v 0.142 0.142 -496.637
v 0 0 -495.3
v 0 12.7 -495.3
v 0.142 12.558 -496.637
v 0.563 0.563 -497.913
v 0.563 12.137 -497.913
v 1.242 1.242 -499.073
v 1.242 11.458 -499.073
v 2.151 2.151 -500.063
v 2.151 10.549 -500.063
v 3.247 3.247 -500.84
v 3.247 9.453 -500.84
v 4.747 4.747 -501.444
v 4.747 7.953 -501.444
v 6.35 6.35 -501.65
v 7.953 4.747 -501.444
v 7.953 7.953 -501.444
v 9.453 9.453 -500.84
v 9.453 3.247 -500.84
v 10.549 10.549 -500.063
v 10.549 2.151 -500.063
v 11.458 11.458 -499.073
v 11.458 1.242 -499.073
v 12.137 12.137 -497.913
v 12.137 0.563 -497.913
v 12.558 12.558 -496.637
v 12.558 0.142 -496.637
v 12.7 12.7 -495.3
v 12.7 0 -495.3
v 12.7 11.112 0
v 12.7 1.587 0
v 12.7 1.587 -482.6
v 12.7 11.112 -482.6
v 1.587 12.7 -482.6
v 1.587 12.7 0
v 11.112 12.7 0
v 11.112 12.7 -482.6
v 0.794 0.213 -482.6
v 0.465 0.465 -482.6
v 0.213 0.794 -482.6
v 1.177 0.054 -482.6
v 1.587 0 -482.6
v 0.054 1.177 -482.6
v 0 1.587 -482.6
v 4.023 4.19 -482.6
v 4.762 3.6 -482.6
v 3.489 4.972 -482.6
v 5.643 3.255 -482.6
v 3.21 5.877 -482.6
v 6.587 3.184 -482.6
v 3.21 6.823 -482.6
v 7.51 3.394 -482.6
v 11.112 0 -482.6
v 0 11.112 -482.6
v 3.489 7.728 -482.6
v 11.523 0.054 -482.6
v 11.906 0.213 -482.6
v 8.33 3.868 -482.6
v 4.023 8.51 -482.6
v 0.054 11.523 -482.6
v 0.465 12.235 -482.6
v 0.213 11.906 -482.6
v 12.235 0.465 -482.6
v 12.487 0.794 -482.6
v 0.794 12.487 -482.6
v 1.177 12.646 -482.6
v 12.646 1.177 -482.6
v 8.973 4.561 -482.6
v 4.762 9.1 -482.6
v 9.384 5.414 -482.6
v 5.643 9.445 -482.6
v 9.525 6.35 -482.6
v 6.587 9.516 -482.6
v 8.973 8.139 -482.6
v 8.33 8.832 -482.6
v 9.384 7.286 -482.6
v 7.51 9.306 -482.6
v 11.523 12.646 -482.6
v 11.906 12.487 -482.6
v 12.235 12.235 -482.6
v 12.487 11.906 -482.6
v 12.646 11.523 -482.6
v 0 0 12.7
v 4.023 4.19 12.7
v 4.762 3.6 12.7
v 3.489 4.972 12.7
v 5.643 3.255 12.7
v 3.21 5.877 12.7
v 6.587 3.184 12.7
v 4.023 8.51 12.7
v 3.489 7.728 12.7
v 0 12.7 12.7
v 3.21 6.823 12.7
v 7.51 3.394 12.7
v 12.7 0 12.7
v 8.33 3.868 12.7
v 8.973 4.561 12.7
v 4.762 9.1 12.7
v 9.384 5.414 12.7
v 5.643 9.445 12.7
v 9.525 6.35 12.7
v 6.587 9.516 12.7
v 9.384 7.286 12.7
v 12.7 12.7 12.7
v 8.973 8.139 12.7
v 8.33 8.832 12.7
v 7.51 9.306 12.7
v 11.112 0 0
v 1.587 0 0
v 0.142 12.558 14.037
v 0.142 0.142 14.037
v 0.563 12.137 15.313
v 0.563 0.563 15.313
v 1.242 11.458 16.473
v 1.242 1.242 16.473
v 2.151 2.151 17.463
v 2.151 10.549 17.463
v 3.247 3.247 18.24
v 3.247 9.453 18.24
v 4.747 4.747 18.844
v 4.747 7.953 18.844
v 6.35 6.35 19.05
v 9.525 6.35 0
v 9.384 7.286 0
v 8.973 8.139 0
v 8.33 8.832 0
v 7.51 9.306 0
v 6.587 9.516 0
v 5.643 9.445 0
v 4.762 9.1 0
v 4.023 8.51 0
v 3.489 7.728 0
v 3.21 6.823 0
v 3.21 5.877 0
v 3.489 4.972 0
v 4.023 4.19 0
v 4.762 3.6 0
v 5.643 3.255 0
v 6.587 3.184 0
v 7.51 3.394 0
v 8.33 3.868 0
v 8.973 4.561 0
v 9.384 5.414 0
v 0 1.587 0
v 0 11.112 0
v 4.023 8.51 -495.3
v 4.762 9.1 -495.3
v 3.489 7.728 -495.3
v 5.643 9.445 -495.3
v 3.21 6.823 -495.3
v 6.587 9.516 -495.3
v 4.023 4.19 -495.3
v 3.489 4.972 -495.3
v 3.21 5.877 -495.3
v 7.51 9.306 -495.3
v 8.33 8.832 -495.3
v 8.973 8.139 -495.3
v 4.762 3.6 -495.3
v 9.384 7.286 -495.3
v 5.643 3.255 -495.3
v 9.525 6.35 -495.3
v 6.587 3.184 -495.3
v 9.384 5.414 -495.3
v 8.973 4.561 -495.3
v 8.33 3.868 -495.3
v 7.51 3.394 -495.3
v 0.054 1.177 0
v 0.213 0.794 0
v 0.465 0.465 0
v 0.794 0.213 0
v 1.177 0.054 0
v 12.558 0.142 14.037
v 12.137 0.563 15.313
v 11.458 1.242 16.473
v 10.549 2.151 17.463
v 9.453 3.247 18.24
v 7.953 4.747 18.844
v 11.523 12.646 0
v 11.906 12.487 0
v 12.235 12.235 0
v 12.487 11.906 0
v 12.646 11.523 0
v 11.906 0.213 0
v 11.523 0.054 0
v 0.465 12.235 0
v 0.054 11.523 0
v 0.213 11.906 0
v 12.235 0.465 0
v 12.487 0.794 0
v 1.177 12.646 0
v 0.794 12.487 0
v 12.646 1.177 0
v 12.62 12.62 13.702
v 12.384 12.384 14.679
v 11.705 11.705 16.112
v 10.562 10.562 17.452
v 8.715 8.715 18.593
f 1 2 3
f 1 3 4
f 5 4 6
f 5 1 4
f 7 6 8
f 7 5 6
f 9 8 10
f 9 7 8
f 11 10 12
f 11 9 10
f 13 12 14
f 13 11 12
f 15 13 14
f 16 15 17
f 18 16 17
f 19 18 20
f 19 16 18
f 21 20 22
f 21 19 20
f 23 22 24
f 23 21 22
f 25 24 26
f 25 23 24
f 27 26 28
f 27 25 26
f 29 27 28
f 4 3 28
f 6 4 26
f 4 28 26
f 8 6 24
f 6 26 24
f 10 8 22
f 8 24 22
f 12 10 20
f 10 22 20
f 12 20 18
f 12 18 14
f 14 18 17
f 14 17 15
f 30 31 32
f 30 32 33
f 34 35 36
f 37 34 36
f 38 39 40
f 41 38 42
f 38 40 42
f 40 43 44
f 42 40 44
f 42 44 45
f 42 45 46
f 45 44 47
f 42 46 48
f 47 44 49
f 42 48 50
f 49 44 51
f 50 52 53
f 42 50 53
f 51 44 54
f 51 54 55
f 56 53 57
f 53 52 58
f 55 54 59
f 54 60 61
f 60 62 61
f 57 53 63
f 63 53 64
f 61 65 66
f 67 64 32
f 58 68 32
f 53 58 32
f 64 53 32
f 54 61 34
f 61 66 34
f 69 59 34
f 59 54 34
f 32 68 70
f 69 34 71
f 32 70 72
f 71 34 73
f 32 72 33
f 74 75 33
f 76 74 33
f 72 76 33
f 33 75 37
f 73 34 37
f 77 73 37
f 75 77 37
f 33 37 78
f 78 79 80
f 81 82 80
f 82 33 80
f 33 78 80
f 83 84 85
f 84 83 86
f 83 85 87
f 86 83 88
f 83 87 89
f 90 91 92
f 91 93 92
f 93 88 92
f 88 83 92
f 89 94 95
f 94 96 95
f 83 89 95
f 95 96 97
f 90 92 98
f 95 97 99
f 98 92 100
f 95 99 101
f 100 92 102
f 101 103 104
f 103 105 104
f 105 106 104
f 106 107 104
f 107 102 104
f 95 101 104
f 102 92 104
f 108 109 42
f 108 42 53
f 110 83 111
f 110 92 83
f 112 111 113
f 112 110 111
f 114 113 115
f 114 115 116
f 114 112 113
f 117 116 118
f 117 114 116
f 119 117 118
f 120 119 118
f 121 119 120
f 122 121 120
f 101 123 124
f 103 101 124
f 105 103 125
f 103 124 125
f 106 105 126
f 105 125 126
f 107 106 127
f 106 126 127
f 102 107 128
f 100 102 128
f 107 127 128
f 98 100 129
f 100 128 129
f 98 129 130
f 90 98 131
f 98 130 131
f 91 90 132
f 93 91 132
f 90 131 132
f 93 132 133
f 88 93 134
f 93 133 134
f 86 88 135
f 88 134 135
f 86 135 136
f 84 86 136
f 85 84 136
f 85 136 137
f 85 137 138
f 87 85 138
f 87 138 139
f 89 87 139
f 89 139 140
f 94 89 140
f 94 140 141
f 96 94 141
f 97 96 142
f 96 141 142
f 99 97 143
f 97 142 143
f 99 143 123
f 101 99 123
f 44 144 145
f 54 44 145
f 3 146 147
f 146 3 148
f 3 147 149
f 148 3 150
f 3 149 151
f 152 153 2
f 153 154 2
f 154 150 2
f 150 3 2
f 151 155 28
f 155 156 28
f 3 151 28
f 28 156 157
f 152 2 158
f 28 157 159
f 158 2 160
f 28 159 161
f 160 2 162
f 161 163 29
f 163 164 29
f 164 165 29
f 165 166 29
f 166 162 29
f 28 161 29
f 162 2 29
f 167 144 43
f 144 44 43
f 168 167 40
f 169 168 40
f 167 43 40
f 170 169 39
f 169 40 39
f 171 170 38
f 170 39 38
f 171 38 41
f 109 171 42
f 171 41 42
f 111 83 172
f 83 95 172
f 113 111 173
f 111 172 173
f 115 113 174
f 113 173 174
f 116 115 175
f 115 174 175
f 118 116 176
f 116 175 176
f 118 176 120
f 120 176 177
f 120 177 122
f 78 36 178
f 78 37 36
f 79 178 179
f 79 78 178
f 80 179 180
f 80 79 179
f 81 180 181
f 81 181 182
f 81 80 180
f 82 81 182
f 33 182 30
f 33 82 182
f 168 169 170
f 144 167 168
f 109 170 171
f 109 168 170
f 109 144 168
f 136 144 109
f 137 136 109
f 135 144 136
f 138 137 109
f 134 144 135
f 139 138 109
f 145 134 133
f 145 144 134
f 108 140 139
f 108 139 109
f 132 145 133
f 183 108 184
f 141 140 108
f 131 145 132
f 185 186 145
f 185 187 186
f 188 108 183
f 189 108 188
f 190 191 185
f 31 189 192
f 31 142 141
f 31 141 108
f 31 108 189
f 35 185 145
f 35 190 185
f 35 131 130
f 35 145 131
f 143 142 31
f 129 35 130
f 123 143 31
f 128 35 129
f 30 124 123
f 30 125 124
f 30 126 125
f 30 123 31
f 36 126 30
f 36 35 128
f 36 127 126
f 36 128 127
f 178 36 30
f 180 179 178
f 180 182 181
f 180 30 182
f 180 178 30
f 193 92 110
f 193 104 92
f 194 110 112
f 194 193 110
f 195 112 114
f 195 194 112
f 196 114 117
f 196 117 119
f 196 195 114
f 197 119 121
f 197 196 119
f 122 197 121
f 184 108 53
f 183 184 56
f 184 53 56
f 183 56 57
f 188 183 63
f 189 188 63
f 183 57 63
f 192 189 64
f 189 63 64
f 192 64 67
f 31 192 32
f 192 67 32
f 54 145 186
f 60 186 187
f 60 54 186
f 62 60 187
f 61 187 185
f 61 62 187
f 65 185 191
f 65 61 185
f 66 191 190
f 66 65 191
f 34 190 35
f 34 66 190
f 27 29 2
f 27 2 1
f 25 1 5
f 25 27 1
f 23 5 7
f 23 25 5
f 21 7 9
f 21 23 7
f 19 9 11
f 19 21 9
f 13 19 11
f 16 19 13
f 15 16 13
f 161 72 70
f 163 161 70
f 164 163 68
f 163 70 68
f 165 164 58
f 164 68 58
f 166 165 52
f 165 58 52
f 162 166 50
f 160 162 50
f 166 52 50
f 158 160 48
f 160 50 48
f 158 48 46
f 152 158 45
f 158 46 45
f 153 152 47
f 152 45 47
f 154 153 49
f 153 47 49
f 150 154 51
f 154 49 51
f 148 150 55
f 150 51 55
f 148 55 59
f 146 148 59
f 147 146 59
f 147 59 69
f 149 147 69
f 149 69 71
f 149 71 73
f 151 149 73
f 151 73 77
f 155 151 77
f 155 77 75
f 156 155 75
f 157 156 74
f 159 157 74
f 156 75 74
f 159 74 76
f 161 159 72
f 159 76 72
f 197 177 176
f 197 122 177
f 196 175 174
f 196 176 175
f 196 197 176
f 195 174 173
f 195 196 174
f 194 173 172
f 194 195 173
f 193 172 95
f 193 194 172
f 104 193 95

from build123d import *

# Parameters (mm, degrees)
F0_W      = 12.7
F0_H      = 12.7
F1_DEPTH  = 482.6
F2_R      = 3.175
F3_DEPTH  = 12.7
F4_R      = 3.175
F5_DEPTH  = 12.7
F6_W      = 12.7
F6_H      = 12.7
F7_DEPTH  = 6.35
F8_R      = 6.34999
F9_W      = 12.7
F9_H      = 12.7
F10_DEPTH = 6.35
F11_R     = 6.34999
F12_R     = 1.5875


# Not quite as in the source:
# - a fillet or chamfer is up to 0.001 mm smaller than in the source, because OpenCascade refuses the exact size


with BuildPart() as f1:
    # F0 (on Top) → F1 (new body)
    with BuildSketch(Plane.XY):
        with Locations((6.35, 6.35)):
            Rectangle(F0_W, F0_H)
    extrude(amount=-F1_DEPTH)

    # F2 (on face) → F3 (join)
    with BuildSketch(Plane.XY):
        with Locations((6.35, 6.35)):
            Circle(F2_R)
    extrude(amount=F3_DEPTH)

    # F4 (on face) → F5 (join)
    with BuildSketch(Plane(origin=(0, 0, -482.6), x_dir=(1, 0, 0), z_dir=(0, 0, -1))):
        with Locations((6.35, -6.35)):
            Circle(F4_R)
    extrude(amount=F5_DEPTH)

    # F6 (on face) → F7 (join)
    with BuildSketch(Plane.XY.offset(12.7)):
        with Locations((6.35, 6.35)):
            Rectangle(F6_W, F6_H)
    extrude(amount=F7_DEPTH)

    # F8 (radius 6.35 in the source; OpenCascade refuses exactly that, so slightly less here)
    f8_edges = [f1.edges().sort_by_distance(p)[0] for p in [
        (0, 6.35, 19.05),
        (6.35, 0, 19.05),
        (12.7, 6.35, 19.05),
        (6.35, 12.7, 19.05),
    ]]
    fillet(f8_edges, radius=F8_R)

    # F9 (on face) → F10 (join)
    with BuildSketch(Plane(origin=(0, 0, -495.3), x_dir=(1, 0, 0), z_dir=(0, 0, -1))):
        with Locations((6.35, -6.35)):
            Rectangle(F9_W, F9_H)
    extrude(amount=F10_DEPTH)

    # F11 (radius 6.35 in the source; OpenCascade refuses exactly that, so slightly less here)
    f11_edges = [f1.edges().sort_by_distance(p)[0] for p in [
        (6.35, 0, -501.65),
        (0, 6.35, -501.65),
        (6.35, 12.7, -501.65),
        (12.7, 6.35, -501.65),
    ]]
    fillet(f11_edges, radius=F11_R)

    # F12
    f12_edges = [f1.edges().sort_by_distance(p)[0] for p in [
        (0, 0, -241.3),
        (0, 12.7, -241.3),
        (12.7, 0, -241.3),
        (12.7, 12.7, -241.3),
    ]]
    fillet(f12_edges, radius=F12_R)


solid = f1.part
